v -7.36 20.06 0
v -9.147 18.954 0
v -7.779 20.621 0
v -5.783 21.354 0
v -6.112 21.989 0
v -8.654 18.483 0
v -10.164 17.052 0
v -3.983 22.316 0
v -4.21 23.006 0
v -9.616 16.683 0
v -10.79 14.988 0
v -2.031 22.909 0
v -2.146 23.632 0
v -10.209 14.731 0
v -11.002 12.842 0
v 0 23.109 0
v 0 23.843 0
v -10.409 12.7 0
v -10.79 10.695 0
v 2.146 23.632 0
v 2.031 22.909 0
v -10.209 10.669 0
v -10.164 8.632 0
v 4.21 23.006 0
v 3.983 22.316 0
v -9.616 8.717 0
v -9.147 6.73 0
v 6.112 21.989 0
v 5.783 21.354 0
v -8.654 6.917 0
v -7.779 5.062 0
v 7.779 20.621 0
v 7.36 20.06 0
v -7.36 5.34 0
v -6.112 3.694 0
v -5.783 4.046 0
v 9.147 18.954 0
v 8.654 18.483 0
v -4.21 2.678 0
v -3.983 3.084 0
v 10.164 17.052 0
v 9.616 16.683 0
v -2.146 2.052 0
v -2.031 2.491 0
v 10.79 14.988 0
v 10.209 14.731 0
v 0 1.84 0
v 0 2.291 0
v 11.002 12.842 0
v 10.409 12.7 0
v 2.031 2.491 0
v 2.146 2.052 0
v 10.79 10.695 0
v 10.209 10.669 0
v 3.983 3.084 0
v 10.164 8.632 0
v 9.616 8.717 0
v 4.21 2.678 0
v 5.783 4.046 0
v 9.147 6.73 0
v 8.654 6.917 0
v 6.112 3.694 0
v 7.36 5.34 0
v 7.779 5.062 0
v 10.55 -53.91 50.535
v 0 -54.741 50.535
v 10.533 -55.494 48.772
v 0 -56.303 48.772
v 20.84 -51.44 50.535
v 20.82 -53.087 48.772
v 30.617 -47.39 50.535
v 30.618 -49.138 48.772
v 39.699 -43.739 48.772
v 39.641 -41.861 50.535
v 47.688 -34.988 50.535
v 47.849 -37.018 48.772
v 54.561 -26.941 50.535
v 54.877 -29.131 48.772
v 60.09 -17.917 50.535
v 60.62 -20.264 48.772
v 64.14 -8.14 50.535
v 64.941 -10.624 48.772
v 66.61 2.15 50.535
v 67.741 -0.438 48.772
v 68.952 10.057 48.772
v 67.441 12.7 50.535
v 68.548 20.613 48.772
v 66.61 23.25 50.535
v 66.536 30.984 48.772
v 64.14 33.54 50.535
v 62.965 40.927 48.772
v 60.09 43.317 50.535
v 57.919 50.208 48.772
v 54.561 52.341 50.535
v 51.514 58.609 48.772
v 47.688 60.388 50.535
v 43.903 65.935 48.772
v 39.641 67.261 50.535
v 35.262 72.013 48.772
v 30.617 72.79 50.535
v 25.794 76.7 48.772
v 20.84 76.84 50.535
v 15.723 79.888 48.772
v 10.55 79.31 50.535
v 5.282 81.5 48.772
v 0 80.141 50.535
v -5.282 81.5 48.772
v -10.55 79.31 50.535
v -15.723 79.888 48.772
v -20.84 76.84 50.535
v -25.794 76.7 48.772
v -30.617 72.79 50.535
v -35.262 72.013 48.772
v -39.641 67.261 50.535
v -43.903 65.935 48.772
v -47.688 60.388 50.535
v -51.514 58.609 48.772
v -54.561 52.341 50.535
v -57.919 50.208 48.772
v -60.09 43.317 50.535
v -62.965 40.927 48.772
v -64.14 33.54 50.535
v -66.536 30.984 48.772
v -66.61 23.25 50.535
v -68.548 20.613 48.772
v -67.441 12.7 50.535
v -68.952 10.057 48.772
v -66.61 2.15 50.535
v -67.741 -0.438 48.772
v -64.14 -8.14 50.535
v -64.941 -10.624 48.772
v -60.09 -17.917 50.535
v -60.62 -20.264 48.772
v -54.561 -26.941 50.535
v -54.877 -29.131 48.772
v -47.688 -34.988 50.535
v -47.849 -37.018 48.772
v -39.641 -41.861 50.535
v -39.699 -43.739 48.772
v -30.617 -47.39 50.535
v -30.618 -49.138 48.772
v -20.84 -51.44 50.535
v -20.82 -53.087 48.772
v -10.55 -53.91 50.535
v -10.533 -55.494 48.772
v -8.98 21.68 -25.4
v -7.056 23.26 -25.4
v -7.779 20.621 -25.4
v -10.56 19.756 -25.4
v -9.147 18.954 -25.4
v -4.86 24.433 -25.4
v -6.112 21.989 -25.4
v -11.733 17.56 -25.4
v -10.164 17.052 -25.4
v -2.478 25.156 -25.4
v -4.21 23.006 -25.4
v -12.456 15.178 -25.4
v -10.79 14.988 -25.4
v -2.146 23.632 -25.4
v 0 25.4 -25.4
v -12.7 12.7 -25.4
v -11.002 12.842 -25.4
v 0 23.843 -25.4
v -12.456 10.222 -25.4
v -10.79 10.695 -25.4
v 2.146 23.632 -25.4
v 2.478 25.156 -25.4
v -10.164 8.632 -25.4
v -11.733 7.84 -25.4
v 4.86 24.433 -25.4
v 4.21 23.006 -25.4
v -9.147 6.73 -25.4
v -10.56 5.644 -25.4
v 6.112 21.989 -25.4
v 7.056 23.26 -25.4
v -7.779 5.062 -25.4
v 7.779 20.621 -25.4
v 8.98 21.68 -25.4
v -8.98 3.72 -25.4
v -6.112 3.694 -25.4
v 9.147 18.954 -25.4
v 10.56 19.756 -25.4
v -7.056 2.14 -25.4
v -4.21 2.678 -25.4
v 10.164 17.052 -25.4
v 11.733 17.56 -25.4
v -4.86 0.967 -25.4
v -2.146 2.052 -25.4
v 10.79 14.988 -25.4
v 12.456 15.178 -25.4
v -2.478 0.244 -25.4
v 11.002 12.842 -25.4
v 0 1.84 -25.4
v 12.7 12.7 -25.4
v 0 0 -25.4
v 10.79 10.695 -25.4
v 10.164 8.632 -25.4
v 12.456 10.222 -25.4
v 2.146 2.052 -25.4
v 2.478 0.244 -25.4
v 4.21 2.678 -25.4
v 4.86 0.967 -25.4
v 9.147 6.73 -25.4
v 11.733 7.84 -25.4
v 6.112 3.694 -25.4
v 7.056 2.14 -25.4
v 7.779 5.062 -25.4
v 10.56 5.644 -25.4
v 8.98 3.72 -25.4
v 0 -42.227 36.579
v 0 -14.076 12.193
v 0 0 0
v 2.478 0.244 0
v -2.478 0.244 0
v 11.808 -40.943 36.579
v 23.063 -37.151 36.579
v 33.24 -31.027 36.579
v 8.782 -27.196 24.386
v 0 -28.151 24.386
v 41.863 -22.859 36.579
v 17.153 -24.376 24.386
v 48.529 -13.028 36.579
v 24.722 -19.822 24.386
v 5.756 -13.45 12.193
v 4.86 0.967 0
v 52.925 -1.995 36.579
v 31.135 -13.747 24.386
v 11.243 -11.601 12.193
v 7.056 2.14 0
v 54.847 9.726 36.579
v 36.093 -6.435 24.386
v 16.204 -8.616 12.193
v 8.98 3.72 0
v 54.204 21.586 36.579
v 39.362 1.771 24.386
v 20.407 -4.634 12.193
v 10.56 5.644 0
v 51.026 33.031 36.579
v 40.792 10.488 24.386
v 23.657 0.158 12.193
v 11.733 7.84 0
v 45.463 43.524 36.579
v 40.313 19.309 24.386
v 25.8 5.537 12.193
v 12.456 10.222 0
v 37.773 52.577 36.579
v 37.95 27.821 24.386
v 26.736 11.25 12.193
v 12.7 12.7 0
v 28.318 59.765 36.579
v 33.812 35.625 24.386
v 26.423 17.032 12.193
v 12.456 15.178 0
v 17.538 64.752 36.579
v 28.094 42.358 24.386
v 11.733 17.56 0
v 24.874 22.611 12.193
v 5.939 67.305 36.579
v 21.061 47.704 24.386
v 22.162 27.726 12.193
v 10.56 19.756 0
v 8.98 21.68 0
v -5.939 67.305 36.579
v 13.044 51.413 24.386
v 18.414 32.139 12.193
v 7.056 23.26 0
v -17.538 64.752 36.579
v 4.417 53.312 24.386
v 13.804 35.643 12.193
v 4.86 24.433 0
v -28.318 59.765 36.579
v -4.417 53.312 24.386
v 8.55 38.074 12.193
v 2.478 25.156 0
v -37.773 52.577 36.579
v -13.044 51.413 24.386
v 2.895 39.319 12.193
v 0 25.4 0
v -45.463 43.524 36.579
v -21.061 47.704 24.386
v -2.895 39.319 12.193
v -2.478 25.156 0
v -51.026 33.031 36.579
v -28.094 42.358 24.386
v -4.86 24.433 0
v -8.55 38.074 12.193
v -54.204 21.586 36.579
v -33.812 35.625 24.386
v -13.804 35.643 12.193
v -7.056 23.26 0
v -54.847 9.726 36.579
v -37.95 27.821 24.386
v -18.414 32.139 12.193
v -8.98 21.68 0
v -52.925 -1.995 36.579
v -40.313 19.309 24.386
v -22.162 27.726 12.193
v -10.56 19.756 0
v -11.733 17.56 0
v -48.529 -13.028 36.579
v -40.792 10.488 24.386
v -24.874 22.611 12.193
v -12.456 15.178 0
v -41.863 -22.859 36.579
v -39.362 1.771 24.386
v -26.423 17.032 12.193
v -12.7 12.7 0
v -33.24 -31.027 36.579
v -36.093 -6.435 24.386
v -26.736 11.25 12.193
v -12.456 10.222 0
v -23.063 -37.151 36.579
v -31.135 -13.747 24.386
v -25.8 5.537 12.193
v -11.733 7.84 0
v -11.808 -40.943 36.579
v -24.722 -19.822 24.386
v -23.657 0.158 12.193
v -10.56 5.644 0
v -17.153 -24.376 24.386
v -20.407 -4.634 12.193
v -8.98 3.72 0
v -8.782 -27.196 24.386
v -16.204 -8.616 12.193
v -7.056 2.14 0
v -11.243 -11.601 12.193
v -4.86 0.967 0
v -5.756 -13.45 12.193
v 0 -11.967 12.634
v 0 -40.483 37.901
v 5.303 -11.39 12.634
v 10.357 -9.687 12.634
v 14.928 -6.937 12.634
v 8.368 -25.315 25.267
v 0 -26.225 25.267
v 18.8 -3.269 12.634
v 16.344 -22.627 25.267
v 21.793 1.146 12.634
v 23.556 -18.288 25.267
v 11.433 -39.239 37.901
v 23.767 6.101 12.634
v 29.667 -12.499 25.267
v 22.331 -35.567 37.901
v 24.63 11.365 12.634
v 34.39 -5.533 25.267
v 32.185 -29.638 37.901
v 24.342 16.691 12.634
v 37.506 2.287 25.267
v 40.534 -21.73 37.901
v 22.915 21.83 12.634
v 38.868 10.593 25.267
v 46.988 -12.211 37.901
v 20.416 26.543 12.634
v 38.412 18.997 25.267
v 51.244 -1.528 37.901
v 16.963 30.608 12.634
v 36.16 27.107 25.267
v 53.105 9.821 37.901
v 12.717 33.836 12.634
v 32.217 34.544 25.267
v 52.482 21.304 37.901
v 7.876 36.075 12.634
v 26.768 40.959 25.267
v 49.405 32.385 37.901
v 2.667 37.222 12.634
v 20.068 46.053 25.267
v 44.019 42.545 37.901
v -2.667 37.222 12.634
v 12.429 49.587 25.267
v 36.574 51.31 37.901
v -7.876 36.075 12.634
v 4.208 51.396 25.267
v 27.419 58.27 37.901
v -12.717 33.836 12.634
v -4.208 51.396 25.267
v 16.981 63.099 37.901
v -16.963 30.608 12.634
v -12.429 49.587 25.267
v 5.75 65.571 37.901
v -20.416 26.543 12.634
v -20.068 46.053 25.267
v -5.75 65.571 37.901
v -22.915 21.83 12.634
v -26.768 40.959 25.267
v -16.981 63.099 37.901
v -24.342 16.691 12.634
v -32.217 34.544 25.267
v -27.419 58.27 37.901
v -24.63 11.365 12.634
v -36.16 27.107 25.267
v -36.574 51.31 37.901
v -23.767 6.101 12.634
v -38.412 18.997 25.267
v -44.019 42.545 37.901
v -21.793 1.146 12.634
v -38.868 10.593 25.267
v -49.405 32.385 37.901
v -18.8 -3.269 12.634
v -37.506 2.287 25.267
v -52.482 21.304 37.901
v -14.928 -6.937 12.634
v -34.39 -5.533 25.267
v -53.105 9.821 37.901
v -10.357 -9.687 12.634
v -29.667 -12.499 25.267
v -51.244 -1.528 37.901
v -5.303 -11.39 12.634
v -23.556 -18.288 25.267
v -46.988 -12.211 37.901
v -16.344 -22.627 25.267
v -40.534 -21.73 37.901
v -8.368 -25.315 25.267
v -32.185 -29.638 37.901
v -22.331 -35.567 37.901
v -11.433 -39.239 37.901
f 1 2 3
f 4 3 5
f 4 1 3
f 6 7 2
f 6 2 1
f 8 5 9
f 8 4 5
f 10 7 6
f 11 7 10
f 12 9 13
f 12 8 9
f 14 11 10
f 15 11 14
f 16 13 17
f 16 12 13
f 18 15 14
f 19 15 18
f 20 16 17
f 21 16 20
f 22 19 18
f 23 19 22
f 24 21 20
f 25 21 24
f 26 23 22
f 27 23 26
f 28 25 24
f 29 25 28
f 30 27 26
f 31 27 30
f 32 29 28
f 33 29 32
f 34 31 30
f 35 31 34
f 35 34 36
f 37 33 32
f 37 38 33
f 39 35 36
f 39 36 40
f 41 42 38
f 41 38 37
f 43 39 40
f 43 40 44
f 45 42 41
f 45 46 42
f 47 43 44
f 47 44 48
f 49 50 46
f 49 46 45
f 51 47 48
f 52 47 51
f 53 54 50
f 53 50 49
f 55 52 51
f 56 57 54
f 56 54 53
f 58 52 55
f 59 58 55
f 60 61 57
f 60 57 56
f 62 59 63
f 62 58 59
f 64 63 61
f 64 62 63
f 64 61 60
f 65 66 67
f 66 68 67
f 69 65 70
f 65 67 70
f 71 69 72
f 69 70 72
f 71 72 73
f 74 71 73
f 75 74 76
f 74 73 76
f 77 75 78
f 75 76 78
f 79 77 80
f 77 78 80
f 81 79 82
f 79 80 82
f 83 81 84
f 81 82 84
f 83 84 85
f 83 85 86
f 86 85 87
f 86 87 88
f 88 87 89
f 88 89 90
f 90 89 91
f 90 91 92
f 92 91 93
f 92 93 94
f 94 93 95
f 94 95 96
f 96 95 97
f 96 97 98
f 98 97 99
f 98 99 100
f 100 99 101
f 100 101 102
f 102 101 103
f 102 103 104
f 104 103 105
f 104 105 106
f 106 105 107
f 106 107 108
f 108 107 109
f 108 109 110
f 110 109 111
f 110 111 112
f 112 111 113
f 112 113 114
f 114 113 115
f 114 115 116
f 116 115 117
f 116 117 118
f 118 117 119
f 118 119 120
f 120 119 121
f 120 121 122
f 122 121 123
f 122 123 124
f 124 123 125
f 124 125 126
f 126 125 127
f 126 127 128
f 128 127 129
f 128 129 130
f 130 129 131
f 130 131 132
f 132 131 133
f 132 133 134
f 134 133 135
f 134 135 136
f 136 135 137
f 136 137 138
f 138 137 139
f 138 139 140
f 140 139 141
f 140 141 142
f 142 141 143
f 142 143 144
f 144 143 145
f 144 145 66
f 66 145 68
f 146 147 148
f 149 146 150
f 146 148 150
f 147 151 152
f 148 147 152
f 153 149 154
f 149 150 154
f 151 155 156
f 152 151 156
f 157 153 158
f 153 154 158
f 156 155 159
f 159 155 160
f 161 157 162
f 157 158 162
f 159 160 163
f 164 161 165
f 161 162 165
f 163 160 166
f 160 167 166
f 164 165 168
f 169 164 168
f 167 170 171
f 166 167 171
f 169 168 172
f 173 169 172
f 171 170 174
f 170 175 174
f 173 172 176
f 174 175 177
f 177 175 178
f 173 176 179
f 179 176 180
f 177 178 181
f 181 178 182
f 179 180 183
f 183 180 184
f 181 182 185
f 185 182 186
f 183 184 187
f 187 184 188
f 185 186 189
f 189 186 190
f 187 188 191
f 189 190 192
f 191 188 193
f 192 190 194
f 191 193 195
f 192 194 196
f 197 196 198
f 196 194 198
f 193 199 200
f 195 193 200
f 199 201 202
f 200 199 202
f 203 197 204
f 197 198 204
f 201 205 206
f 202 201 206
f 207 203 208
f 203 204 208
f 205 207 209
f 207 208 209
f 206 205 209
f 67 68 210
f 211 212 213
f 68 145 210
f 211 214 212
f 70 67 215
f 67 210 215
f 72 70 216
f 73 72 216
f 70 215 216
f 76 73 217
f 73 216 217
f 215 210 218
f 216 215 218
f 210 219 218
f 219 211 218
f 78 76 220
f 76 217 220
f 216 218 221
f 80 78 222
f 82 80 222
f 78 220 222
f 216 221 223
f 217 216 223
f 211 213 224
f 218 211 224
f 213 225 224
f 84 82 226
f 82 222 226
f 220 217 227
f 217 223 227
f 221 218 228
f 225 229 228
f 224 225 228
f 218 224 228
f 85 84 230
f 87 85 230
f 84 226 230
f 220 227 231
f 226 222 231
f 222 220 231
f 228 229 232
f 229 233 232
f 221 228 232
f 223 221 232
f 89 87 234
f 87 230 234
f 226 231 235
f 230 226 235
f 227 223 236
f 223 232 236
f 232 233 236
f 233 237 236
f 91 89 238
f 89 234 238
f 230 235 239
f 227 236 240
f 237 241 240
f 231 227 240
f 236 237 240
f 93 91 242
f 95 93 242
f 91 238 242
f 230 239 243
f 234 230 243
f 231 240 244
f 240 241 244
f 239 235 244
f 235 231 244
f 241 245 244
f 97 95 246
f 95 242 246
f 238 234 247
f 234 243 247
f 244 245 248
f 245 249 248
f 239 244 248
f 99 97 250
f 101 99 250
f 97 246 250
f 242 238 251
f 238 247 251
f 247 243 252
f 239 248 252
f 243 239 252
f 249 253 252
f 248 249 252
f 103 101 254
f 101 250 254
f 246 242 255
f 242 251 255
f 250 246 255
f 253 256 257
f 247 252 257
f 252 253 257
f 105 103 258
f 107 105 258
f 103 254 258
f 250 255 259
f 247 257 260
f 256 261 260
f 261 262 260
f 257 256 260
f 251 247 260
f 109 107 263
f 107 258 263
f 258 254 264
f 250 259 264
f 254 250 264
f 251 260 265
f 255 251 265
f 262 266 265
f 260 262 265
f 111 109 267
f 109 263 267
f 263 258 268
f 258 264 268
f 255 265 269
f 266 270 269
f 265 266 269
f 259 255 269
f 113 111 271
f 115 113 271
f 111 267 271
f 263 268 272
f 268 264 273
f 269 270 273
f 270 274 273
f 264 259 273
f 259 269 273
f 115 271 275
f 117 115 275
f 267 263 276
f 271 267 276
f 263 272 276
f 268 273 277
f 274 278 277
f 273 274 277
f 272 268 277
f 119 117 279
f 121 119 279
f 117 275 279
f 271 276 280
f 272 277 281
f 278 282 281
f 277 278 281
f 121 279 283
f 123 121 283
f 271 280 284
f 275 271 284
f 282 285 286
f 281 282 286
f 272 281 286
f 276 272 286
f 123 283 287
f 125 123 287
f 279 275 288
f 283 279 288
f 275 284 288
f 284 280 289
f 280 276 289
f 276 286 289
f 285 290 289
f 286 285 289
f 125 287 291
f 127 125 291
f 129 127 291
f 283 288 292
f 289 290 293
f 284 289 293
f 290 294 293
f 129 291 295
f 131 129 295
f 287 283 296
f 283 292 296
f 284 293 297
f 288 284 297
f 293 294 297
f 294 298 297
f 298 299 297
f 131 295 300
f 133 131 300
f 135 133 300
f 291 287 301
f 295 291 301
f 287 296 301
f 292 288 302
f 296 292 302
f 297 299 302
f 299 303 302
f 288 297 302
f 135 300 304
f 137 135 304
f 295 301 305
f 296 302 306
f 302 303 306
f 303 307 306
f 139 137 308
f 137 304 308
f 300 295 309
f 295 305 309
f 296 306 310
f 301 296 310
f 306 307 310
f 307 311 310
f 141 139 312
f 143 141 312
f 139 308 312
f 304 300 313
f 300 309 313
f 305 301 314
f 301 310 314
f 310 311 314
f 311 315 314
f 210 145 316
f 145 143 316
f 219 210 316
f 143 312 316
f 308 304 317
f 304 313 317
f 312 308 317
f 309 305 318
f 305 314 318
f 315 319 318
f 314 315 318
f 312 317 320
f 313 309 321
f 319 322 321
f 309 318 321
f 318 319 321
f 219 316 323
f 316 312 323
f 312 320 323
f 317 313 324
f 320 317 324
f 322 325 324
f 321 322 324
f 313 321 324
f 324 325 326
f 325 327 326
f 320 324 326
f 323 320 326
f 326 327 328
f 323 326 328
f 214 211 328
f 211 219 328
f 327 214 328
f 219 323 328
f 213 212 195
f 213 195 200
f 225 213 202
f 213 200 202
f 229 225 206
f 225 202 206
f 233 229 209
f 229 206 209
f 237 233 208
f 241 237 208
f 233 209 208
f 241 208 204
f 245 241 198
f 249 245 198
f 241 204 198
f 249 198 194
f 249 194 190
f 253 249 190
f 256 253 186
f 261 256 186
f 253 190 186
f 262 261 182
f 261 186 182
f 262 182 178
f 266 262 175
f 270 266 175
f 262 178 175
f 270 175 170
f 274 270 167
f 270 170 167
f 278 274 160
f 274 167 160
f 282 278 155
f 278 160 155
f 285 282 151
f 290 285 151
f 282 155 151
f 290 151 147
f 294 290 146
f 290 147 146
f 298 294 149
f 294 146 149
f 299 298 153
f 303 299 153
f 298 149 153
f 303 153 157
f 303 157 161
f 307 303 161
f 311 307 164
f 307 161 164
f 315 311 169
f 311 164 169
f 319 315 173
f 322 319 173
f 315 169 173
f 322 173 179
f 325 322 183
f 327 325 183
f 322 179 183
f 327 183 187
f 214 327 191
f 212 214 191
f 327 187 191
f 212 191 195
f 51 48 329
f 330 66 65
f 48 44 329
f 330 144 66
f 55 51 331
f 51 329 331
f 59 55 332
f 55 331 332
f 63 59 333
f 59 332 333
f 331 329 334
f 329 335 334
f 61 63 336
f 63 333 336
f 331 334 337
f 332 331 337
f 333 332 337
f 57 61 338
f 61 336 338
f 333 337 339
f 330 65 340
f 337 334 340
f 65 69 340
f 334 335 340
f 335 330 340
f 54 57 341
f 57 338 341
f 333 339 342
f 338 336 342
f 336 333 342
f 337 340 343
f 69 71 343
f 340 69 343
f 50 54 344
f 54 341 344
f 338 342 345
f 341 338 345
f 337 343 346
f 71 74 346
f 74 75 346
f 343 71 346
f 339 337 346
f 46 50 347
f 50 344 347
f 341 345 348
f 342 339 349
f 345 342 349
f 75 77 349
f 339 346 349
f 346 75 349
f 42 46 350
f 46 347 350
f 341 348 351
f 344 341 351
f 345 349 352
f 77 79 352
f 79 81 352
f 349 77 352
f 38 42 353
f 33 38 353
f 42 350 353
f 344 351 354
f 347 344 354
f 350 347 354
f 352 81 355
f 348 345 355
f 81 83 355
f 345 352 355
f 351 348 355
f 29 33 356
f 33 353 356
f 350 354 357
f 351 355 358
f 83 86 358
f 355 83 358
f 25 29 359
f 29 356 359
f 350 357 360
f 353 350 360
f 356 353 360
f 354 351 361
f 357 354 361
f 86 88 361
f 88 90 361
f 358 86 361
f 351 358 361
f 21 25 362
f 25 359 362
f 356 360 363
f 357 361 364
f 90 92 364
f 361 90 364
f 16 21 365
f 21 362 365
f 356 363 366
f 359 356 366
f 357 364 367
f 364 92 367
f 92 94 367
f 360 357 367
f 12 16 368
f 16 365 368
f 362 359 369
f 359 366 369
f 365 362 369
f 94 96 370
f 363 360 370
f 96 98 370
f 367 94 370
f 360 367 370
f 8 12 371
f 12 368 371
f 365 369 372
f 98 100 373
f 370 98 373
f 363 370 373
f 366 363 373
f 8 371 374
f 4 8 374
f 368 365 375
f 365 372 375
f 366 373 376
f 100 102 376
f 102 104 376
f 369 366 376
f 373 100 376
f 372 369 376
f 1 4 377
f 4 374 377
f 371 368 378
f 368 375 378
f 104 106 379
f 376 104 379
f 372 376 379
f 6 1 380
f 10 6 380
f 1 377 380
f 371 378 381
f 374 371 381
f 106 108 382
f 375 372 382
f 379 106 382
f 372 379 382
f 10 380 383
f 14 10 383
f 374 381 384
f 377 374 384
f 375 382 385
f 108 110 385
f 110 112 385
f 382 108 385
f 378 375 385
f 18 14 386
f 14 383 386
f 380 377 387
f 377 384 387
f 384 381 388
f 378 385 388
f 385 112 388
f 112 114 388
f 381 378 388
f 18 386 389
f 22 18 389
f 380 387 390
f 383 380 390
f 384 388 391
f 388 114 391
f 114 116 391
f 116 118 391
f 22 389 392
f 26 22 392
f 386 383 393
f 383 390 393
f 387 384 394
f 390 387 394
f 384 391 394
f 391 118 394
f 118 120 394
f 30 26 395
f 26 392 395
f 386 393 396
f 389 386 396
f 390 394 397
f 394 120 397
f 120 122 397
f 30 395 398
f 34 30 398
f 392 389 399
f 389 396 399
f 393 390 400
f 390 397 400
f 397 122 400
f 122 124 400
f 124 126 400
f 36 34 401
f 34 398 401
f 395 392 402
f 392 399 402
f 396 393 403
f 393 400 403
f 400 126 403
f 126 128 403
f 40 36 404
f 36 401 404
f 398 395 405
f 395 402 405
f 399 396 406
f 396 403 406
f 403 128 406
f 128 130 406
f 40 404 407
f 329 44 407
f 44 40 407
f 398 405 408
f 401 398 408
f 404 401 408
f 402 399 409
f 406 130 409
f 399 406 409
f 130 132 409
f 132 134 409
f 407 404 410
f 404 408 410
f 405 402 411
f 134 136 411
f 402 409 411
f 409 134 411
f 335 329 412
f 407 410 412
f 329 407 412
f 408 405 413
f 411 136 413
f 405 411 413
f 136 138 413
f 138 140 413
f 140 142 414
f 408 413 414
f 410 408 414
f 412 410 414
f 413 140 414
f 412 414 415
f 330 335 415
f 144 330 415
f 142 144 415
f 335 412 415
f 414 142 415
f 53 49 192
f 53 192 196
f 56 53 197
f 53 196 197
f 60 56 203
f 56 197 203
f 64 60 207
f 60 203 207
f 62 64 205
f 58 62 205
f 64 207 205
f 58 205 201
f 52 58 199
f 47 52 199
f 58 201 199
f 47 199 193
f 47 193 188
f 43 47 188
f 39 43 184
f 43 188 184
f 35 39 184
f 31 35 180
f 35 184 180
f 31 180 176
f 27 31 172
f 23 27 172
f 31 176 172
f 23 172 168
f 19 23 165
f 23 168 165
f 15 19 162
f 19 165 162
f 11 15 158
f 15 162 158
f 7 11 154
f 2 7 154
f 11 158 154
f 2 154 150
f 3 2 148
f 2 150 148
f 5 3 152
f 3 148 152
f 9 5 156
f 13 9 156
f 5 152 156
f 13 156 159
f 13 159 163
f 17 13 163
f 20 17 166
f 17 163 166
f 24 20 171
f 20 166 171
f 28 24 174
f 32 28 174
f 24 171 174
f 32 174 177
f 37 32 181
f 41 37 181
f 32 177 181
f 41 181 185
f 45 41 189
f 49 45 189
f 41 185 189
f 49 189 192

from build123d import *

# Parameters (mm, degrees)
F3_R     = 11.001579
F4_DEPTH = 25.4


with BuildPart() as f1:
    # F0 (on Right) → F1 (revolve)
    with BuildSketch(Plane.YZ):
        Polygon((-56.302847, 48.771877), (0, 0), (0, -25.4), (12.7, -25.4), (12.7, 0), (2.291456, 0), (-54.740725, 50.534844), align=None)
    revolve(axis=Axis((0, 12.7, -12.7), (0, 0, 1)))

    # F3 (on face) → F4 (cut)
    with BuildSketch(Plane(origin=(0, 0, -25.4), x_dir=(1, 0, 0), z_dir=(0, 0, -1))):
        with Locations((0, -12.841756)):
            Circle(F3_R)
    extrude(amount=-F4_DEPTH, mode=Mode.SUBTRACT)


solid = f1.part
